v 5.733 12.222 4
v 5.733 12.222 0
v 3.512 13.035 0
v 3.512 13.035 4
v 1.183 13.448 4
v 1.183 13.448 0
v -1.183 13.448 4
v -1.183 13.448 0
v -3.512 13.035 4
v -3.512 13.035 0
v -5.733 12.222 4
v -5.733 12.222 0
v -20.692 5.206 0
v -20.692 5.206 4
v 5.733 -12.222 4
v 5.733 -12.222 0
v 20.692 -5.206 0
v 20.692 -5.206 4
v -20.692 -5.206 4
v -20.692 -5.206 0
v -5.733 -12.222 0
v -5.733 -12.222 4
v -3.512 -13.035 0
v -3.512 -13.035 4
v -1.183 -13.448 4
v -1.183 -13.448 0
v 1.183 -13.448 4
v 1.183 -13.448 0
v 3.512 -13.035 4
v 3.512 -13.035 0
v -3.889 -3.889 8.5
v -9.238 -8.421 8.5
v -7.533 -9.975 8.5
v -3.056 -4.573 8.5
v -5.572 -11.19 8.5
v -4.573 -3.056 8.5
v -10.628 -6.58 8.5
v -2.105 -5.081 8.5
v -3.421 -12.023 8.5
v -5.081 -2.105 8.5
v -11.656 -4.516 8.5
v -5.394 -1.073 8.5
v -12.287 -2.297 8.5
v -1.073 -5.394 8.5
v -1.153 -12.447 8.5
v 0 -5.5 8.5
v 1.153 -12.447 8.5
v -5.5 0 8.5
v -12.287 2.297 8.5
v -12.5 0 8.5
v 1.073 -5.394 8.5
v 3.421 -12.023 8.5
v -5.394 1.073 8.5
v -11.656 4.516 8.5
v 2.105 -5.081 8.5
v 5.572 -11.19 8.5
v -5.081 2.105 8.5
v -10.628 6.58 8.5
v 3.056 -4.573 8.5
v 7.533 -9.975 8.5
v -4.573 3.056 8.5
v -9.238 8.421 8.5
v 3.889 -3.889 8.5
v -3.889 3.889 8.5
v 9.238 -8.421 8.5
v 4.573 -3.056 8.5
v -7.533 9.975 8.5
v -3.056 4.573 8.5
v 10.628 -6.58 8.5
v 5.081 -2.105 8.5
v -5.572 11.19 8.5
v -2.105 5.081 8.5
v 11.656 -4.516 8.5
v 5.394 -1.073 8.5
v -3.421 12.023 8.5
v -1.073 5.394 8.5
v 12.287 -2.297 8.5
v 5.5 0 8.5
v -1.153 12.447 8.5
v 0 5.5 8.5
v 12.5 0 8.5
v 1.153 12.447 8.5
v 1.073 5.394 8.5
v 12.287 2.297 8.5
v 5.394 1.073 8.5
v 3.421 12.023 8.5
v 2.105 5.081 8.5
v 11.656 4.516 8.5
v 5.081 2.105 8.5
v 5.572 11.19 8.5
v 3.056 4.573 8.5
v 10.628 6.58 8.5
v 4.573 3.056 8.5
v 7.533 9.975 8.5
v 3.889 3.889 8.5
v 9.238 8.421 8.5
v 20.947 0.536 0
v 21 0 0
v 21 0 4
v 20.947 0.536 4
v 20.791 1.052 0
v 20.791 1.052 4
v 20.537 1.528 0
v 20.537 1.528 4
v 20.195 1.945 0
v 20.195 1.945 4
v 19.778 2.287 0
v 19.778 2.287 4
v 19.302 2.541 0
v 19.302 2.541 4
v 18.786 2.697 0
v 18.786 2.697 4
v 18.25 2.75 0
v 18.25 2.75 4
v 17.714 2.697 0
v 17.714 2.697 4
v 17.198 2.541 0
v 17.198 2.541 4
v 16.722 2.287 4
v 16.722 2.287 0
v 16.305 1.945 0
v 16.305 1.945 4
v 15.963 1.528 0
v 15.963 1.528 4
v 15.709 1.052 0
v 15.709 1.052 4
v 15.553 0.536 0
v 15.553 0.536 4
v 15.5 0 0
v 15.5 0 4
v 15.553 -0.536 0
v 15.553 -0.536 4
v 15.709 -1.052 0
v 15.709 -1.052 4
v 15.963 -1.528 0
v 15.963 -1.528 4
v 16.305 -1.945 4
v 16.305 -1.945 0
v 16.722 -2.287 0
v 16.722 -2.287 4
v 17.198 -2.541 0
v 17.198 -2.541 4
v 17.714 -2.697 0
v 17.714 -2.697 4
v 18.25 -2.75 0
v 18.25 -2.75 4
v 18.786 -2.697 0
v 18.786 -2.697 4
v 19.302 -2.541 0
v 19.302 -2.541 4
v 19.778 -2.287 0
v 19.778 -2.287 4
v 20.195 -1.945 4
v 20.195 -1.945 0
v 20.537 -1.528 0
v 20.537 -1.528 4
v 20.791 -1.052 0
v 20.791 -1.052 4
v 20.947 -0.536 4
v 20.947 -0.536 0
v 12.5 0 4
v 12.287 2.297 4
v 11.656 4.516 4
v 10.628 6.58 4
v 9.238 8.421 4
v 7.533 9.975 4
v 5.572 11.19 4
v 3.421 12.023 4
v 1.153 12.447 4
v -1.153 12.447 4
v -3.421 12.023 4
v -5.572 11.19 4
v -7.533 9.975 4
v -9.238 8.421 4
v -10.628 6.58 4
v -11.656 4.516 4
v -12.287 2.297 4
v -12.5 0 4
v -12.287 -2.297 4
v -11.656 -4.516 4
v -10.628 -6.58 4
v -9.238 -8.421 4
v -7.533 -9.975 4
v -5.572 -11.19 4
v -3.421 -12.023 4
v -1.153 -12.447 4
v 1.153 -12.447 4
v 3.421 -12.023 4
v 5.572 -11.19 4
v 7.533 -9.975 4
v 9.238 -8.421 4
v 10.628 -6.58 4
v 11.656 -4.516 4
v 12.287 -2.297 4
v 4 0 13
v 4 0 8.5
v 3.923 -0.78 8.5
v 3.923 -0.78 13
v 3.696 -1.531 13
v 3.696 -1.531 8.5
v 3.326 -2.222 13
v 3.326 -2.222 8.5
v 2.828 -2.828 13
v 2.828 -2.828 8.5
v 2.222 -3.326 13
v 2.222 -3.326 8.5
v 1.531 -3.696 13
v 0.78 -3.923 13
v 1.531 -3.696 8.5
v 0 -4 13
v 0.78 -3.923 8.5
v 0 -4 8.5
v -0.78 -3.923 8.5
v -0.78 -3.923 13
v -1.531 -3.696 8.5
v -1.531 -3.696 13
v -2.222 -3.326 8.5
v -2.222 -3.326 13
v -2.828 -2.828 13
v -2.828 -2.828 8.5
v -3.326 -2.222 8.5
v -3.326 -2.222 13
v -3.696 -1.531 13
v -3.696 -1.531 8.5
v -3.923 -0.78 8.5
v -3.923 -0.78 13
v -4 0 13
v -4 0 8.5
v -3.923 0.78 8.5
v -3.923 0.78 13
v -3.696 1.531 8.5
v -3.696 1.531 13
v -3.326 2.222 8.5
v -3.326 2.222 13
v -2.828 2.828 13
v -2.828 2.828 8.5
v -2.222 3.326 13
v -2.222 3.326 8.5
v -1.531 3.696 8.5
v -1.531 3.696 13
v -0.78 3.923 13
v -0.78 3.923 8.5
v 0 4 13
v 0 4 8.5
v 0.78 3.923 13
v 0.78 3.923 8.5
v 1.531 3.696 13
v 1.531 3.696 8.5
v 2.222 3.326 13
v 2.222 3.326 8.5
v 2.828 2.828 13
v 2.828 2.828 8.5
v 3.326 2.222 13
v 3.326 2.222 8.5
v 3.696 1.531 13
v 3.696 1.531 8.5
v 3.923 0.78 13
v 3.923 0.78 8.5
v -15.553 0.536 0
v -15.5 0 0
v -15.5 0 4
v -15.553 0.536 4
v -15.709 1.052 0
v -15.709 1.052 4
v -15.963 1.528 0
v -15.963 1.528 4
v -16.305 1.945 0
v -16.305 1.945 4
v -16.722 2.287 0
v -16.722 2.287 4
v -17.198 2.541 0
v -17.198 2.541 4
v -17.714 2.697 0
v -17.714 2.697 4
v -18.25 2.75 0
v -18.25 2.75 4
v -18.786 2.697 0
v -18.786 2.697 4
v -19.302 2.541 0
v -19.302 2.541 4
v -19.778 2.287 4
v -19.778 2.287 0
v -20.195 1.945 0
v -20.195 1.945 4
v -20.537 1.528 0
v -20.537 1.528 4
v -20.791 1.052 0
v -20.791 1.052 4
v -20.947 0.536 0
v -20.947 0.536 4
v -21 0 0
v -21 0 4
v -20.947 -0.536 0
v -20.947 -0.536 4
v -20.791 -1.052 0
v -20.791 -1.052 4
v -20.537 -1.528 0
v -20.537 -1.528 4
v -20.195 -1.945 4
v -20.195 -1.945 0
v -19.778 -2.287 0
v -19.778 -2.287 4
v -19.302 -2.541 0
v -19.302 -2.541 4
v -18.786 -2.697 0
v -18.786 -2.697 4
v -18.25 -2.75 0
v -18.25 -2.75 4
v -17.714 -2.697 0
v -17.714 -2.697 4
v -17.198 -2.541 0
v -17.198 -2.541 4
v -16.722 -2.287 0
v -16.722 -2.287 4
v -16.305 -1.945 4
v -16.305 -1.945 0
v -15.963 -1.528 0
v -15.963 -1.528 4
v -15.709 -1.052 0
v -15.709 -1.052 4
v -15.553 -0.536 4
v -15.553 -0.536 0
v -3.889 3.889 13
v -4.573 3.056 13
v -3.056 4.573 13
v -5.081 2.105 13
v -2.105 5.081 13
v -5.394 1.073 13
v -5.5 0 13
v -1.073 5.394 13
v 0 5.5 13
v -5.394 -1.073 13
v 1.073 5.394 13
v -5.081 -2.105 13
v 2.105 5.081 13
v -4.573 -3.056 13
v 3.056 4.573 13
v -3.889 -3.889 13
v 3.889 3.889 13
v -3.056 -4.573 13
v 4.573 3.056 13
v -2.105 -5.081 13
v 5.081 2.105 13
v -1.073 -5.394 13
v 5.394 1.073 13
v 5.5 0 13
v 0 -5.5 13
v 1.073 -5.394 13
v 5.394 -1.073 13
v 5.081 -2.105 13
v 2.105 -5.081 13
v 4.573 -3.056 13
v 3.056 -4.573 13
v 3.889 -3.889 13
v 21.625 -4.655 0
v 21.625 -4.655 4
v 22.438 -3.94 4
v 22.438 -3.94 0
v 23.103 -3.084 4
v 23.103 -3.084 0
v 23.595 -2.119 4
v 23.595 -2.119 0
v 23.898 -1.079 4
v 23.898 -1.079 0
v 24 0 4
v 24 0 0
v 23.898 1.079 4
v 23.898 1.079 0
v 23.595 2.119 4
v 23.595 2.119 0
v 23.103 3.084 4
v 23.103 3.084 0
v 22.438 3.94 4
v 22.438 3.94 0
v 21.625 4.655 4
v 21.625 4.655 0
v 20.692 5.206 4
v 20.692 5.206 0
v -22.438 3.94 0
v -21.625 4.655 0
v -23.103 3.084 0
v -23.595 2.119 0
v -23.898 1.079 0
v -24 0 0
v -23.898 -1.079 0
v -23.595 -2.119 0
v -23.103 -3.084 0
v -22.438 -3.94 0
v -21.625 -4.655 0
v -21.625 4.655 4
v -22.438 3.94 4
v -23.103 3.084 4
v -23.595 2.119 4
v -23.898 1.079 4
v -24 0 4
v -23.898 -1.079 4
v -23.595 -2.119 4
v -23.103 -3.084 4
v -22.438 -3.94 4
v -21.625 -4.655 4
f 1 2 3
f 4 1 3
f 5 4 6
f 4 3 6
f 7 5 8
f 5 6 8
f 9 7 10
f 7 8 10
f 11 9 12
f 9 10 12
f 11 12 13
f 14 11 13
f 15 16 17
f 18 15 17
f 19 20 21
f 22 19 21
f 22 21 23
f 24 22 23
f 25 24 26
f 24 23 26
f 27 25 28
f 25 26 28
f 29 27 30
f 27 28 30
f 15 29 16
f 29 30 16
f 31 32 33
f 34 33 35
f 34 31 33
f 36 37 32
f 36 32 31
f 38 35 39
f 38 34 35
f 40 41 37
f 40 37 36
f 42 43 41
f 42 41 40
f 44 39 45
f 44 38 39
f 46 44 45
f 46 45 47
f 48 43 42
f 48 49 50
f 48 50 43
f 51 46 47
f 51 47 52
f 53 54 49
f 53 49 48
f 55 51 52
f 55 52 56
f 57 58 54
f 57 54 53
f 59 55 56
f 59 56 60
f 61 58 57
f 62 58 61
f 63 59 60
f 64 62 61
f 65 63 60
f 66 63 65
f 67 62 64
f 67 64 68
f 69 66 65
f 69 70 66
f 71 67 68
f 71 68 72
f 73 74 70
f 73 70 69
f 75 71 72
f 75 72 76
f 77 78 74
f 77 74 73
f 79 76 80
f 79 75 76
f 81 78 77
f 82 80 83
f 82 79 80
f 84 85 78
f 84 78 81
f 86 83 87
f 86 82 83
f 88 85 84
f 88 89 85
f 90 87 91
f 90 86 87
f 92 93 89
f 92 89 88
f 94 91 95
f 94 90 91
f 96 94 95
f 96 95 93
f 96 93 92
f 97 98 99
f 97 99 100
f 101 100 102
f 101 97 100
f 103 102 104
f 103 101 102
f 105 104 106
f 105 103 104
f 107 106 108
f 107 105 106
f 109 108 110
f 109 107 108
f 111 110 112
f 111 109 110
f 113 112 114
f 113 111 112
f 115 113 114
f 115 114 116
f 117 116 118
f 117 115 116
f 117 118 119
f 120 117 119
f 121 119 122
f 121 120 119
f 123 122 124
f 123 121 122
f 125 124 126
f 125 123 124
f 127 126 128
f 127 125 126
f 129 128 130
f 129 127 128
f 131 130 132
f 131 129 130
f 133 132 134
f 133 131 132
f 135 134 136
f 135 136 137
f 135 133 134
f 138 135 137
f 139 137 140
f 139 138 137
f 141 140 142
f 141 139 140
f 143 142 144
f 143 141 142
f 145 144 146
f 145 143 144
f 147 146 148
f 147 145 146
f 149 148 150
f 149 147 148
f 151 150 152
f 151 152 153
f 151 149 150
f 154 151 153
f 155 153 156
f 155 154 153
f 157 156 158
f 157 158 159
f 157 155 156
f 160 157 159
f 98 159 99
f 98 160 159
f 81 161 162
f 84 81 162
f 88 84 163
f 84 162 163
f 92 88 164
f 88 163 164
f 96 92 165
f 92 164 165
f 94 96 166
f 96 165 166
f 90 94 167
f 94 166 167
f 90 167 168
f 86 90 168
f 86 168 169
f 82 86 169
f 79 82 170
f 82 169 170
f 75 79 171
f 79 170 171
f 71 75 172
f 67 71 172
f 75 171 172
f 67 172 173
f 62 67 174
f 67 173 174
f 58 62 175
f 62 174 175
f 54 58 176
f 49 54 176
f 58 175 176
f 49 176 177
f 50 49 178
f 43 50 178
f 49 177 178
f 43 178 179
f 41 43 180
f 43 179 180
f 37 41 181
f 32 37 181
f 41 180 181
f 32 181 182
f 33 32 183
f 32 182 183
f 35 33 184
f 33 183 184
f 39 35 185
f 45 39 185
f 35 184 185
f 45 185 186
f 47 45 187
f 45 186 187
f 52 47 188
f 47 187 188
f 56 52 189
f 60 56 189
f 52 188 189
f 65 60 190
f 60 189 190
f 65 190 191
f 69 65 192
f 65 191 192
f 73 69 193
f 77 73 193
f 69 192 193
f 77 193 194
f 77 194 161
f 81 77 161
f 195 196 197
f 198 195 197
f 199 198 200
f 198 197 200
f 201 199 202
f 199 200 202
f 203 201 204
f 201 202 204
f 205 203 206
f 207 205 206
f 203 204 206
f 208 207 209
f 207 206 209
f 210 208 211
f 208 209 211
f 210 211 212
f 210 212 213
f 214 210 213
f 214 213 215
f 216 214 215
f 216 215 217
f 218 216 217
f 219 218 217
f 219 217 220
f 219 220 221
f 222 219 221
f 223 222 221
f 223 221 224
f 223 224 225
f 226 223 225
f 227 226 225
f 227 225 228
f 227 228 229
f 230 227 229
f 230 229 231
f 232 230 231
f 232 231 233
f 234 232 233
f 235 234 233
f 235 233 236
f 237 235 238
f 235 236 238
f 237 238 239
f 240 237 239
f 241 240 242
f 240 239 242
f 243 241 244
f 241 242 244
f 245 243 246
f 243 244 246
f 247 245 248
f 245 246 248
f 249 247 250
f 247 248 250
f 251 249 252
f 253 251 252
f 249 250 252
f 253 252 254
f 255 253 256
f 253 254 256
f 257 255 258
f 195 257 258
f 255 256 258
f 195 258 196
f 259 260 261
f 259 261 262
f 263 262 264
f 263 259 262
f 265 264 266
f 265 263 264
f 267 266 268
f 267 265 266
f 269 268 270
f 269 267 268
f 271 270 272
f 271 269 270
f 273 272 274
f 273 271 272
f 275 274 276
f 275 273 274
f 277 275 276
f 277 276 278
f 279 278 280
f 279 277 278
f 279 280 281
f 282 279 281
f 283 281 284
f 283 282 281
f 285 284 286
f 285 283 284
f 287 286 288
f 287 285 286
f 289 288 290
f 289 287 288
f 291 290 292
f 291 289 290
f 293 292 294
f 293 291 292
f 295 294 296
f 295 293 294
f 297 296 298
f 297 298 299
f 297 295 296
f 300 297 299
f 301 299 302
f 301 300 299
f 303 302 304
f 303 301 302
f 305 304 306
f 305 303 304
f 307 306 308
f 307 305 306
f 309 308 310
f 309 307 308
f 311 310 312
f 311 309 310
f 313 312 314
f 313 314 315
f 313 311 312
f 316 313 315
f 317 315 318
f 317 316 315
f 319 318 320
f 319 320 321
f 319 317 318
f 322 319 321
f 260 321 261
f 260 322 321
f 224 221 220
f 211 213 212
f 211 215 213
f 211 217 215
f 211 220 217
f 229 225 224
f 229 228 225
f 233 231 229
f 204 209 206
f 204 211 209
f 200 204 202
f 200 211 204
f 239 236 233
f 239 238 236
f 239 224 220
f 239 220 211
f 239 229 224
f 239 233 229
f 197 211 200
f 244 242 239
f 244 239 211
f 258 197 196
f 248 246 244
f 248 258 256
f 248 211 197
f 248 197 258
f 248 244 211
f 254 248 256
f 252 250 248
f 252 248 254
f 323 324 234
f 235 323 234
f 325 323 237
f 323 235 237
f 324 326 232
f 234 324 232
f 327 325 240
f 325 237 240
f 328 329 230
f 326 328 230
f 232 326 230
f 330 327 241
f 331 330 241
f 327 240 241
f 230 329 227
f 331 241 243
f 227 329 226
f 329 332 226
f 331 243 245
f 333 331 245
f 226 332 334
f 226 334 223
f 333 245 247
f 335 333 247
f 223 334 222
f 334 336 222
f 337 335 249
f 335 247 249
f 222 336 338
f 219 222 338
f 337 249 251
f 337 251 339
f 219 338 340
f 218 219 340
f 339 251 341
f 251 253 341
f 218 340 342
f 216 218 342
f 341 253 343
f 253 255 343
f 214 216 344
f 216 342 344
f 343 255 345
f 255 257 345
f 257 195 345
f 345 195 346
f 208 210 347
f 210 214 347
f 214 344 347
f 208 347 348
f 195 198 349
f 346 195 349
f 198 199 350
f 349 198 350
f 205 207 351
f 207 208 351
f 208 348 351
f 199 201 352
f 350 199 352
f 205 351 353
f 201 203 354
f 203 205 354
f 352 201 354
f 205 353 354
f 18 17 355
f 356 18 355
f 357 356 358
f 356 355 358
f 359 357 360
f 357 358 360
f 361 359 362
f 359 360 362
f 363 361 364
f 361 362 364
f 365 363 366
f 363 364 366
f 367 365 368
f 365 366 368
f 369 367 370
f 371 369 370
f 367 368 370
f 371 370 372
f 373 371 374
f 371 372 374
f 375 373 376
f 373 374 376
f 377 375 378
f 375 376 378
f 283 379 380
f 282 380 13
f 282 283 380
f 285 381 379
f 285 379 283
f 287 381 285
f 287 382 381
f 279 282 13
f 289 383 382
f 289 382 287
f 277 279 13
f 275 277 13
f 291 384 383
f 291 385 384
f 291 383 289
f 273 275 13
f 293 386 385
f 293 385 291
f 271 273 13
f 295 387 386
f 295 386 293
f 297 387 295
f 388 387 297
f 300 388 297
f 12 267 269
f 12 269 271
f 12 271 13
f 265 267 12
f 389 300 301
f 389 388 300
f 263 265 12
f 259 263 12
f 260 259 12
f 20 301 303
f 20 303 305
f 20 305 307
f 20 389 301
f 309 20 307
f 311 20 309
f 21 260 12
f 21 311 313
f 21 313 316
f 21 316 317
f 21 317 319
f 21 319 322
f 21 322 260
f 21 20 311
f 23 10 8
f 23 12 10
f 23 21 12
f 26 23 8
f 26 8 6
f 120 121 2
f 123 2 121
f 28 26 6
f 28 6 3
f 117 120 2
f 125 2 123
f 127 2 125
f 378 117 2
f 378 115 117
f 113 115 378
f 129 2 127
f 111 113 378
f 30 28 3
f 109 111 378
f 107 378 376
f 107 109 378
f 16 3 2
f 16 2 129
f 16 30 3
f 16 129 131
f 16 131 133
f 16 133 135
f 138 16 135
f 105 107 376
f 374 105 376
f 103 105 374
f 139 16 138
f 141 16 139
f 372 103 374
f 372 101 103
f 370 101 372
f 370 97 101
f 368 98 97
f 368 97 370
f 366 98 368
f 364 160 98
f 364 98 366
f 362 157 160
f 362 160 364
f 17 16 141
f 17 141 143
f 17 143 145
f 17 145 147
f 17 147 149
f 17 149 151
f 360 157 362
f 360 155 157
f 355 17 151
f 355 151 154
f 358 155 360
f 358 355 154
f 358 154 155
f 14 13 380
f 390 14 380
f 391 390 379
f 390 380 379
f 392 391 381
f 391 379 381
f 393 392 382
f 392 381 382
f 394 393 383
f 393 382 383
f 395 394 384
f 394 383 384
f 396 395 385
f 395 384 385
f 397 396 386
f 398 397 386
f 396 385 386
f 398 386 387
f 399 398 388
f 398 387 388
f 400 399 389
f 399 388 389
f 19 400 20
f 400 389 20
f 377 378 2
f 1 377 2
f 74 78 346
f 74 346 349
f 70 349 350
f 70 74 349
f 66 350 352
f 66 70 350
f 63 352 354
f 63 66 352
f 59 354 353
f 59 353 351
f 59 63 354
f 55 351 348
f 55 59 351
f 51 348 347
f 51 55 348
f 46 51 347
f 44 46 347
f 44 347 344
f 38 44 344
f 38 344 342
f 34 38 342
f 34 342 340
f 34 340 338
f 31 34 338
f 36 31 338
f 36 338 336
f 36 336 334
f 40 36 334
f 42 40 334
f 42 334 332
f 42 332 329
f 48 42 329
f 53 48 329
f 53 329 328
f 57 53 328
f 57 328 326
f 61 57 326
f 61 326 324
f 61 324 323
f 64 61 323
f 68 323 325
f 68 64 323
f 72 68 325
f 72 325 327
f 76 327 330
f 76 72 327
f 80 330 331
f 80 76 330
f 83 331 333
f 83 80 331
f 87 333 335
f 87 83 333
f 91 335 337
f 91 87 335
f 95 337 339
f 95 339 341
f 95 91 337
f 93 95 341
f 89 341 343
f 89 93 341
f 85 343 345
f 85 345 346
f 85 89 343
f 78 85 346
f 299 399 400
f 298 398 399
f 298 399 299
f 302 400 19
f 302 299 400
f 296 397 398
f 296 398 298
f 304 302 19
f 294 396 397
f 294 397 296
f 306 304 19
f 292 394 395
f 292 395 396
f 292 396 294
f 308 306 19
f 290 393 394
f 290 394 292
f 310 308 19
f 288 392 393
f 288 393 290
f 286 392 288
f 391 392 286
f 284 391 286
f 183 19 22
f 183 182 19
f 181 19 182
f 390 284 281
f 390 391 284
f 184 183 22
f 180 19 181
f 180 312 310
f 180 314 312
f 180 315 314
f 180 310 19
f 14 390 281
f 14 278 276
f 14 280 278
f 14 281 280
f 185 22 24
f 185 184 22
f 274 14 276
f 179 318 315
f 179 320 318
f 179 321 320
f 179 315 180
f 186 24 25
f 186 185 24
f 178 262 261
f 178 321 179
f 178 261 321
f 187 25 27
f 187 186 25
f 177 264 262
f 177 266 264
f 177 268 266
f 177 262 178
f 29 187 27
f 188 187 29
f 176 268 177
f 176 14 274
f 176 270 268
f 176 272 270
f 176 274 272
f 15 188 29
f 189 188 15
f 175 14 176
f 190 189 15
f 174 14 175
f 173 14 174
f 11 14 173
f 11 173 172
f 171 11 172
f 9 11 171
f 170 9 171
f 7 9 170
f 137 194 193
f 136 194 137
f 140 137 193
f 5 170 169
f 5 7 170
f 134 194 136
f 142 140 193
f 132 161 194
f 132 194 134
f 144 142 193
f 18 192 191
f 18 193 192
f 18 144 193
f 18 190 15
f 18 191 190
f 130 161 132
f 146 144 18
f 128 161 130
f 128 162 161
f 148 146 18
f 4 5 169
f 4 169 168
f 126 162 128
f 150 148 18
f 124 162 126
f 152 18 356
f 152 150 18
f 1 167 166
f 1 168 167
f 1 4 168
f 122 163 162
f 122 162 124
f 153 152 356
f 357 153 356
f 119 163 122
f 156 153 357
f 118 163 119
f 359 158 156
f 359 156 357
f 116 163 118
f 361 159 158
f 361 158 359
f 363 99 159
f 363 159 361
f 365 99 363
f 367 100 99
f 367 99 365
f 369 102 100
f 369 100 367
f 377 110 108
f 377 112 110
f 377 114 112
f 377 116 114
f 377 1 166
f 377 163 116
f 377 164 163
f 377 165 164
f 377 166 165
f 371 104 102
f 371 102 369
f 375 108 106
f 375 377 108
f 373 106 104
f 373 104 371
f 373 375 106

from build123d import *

# Parameters (mm, degrees)
F0_R     = 2.75
F1_DEPTH = 4
F2_R     = 12.5
F3_DEPTH = 4.5
F4_R     = 5.5
F4_R_2   = 4
F5_DEPTH = 13


with BuildPart() as f1:
    # F0 (on Top) → F1 (new body)
    with BuildSketch(Plane.XY):
        with BuildLine():
            Line((-20.691781, -5.205786), (-5.732877, -12.22228))
            ThreePointArc((-5.732877, -12.22228), (0, -13.5), (5.732877, -12.22228))
            Line((5.732877, -12.22228), (20.691781, -5.205786))
            ThreePointArc((20.691781, -5.205786), (24, 0), (20.691781, 5.205786))
            Line((20.691781, 5.205786), (5.732877, 12.22228))
            ThreePointArc((5.732877, 12.22228), (0, 13.5), (-5.732877, 12.22228))
            Line((-5.732877, 12.22228), (-20.691781, 5.205786))
            ThreePointArc((-20.691781, 5.205786), (-24, 0), (-20.691781, -5.205786))
        make_face()
        with Locations((-18.25, 0)):
            Circle(F0_R, mode=Mode.SUBTRACT)
        with Locations((18.25, 0)):
            Circle(F0_R, mode=Mode.SUBTRACT)
    extrude(amount=F1_DEPTH)

    # F2 (on face) → F3 (join)
    with BuildSketch(Plane.XY.offset(4)):
        Circle(F2_R)
    extrude(amount=F3_DEPTH)

    # F4 (on face) → F5 (join)
    with BuildSketch(Plane(origin=(0, 0, 0), x_dir=(1, 0, 0), z_dir=(0, 0, -1))):
        Circle(F4_R)
        Circle(F4_R_2, mode=Mode.SUBTRACT)
    extrude(amount=-F5_DEPTH)


solid = f1.part
